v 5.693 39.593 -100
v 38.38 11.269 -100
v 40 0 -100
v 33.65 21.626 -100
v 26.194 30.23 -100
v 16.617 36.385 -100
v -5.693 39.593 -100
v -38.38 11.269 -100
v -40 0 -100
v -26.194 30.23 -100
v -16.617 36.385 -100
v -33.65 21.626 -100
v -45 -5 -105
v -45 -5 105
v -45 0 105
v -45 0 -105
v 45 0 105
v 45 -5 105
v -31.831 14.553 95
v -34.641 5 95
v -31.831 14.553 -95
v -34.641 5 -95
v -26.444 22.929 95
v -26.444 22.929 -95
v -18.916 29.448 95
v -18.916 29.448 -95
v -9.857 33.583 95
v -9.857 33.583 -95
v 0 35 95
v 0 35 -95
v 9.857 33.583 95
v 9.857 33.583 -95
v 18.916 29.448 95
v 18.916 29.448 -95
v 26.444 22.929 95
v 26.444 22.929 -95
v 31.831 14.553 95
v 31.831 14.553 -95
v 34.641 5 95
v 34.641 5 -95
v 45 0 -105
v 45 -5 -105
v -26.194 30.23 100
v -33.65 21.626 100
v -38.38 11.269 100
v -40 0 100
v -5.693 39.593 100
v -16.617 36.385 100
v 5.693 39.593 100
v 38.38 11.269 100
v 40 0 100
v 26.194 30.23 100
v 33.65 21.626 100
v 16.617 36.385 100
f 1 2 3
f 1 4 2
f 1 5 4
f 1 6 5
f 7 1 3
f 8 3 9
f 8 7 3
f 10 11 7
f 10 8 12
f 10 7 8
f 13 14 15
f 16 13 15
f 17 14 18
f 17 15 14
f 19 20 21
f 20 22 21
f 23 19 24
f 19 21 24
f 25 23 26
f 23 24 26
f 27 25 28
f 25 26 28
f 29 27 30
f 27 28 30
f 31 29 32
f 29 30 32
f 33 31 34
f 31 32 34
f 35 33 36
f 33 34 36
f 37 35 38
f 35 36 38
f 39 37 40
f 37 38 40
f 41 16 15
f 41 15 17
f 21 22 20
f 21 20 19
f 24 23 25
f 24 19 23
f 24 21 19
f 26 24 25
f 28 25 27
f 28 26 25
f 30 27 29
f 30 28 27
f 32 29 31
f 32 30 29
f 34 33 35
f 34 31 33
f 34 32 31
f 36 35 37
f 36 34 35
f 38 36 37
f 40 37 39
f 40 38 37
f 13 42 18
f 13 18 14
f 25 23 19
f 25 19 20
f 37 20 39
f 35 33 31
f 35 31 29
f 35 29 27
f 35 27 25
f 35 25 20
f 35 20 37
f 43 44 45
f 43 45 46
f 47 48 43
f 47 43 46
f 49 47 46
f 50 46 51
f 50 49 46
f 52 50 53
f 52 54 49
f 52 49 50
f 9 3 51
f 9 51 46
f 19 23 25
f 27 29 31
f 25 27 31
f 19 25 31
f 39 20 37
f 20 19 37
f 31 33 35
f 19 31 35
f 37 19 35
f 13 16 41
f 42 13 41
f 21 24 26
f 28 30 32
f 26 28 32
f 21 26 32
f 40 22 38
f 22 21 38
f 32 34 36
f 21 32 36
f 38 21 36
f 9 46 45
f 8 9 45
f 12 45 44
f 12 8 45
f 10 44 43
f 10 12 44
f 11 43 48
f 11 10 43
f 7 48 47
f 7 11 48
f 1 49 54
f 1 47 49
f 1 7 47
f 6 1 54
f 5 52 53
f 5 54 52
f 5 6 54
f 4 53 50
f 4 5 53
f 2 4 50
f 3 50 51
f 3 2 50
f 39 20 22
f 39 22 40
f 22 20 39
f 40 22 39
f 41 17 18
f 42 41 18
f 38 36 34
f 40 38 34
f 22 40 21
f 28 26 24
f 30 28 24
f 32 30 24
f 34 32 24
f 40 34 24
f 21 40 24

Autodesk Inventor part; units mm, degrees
ref_plane "YZ Plane" through (0, 0, 0) normal (1, 0, 0) x (0, 1, 0)
ref_plane "XZ Plane" through (0, 0, 0) normal (0, 1, 0) x (-1, 0, 0)
ref_plane "XY Plane" through (0, 0, 0) normal (0, 0, 1) x (1, 0, 0)
sketch "Sketch1" plane through (0, 0, 0) normal (0, 0, 1) x (1, 0, 0)
  line L0 (0, 0) -> (40, 0)
  arc A0 (40, 0) -> (-40, 0) centre (0, 0) ccw
  line L1 (0, 0) -> (-40, 0)
  line L2 (0, 5) -> (34.641, 5)
  arc A1 (34.641, 5) -> (-34.641, 5) centre (0, 0) ccw
  line L3 (-34.641, 5) -> (0, 5)
  line L4 (40, 0) -> (45, 0)
  line L5 (45, 0) -> (45, -5)
  line L6 (45, -5) -> (-45, -5)
  line L7 (-45, -5) -> (-45, 0)
  line L8 (-45, 0) -> (-40, 0)
  dimension "d0" = 40
  dimension "d1" = 5
  dimension "d2" = 5
  dimension "d3" = 5
  dimension "d4" = 90
extrude "Extrusion1" add sketch "Sketch1" along normal mid plane 190 contours L3 A1 L2
extrude "Extrusion2" add sketch "Sketch1" along normal mid plane 200 separate body contours L1 A0 L0
extrude "Extrusion3" add sketch "Sketch1" along normal mid plane 210 separate body contours L0 L4 L5 L6 L7 L8 L1
sketch "Sketch2" plane through (0, 0, 100) normal (0, 0, 1) x (1, 0, 0)
  arc A0 (34.641, 5) -> (-34.641, 5) centre (0, 0) ccw projected
  line L0 (34.641, 5) -> (-34.641, 5) projected
extrude "Extrusion4" add sketch "Sketch2" against normal blind 5 separate body
sketch "Sketch3" plane through (0, 0, -100) normal (0, 0, -1) x (-1, 0, 0)
  arc A0 (34.641, 5) -> (-34.641, 5) centre (0, 0) ccw projected
  line L0 (34.641, 5) -> (-34.641, 5) projected
extrude "Extrusion5" add sketch "Sketch3" against normal blind 5 separate body
combine bodies "Combine1" operation type add bodies to combine 5 4 2
properties part number "Project"
